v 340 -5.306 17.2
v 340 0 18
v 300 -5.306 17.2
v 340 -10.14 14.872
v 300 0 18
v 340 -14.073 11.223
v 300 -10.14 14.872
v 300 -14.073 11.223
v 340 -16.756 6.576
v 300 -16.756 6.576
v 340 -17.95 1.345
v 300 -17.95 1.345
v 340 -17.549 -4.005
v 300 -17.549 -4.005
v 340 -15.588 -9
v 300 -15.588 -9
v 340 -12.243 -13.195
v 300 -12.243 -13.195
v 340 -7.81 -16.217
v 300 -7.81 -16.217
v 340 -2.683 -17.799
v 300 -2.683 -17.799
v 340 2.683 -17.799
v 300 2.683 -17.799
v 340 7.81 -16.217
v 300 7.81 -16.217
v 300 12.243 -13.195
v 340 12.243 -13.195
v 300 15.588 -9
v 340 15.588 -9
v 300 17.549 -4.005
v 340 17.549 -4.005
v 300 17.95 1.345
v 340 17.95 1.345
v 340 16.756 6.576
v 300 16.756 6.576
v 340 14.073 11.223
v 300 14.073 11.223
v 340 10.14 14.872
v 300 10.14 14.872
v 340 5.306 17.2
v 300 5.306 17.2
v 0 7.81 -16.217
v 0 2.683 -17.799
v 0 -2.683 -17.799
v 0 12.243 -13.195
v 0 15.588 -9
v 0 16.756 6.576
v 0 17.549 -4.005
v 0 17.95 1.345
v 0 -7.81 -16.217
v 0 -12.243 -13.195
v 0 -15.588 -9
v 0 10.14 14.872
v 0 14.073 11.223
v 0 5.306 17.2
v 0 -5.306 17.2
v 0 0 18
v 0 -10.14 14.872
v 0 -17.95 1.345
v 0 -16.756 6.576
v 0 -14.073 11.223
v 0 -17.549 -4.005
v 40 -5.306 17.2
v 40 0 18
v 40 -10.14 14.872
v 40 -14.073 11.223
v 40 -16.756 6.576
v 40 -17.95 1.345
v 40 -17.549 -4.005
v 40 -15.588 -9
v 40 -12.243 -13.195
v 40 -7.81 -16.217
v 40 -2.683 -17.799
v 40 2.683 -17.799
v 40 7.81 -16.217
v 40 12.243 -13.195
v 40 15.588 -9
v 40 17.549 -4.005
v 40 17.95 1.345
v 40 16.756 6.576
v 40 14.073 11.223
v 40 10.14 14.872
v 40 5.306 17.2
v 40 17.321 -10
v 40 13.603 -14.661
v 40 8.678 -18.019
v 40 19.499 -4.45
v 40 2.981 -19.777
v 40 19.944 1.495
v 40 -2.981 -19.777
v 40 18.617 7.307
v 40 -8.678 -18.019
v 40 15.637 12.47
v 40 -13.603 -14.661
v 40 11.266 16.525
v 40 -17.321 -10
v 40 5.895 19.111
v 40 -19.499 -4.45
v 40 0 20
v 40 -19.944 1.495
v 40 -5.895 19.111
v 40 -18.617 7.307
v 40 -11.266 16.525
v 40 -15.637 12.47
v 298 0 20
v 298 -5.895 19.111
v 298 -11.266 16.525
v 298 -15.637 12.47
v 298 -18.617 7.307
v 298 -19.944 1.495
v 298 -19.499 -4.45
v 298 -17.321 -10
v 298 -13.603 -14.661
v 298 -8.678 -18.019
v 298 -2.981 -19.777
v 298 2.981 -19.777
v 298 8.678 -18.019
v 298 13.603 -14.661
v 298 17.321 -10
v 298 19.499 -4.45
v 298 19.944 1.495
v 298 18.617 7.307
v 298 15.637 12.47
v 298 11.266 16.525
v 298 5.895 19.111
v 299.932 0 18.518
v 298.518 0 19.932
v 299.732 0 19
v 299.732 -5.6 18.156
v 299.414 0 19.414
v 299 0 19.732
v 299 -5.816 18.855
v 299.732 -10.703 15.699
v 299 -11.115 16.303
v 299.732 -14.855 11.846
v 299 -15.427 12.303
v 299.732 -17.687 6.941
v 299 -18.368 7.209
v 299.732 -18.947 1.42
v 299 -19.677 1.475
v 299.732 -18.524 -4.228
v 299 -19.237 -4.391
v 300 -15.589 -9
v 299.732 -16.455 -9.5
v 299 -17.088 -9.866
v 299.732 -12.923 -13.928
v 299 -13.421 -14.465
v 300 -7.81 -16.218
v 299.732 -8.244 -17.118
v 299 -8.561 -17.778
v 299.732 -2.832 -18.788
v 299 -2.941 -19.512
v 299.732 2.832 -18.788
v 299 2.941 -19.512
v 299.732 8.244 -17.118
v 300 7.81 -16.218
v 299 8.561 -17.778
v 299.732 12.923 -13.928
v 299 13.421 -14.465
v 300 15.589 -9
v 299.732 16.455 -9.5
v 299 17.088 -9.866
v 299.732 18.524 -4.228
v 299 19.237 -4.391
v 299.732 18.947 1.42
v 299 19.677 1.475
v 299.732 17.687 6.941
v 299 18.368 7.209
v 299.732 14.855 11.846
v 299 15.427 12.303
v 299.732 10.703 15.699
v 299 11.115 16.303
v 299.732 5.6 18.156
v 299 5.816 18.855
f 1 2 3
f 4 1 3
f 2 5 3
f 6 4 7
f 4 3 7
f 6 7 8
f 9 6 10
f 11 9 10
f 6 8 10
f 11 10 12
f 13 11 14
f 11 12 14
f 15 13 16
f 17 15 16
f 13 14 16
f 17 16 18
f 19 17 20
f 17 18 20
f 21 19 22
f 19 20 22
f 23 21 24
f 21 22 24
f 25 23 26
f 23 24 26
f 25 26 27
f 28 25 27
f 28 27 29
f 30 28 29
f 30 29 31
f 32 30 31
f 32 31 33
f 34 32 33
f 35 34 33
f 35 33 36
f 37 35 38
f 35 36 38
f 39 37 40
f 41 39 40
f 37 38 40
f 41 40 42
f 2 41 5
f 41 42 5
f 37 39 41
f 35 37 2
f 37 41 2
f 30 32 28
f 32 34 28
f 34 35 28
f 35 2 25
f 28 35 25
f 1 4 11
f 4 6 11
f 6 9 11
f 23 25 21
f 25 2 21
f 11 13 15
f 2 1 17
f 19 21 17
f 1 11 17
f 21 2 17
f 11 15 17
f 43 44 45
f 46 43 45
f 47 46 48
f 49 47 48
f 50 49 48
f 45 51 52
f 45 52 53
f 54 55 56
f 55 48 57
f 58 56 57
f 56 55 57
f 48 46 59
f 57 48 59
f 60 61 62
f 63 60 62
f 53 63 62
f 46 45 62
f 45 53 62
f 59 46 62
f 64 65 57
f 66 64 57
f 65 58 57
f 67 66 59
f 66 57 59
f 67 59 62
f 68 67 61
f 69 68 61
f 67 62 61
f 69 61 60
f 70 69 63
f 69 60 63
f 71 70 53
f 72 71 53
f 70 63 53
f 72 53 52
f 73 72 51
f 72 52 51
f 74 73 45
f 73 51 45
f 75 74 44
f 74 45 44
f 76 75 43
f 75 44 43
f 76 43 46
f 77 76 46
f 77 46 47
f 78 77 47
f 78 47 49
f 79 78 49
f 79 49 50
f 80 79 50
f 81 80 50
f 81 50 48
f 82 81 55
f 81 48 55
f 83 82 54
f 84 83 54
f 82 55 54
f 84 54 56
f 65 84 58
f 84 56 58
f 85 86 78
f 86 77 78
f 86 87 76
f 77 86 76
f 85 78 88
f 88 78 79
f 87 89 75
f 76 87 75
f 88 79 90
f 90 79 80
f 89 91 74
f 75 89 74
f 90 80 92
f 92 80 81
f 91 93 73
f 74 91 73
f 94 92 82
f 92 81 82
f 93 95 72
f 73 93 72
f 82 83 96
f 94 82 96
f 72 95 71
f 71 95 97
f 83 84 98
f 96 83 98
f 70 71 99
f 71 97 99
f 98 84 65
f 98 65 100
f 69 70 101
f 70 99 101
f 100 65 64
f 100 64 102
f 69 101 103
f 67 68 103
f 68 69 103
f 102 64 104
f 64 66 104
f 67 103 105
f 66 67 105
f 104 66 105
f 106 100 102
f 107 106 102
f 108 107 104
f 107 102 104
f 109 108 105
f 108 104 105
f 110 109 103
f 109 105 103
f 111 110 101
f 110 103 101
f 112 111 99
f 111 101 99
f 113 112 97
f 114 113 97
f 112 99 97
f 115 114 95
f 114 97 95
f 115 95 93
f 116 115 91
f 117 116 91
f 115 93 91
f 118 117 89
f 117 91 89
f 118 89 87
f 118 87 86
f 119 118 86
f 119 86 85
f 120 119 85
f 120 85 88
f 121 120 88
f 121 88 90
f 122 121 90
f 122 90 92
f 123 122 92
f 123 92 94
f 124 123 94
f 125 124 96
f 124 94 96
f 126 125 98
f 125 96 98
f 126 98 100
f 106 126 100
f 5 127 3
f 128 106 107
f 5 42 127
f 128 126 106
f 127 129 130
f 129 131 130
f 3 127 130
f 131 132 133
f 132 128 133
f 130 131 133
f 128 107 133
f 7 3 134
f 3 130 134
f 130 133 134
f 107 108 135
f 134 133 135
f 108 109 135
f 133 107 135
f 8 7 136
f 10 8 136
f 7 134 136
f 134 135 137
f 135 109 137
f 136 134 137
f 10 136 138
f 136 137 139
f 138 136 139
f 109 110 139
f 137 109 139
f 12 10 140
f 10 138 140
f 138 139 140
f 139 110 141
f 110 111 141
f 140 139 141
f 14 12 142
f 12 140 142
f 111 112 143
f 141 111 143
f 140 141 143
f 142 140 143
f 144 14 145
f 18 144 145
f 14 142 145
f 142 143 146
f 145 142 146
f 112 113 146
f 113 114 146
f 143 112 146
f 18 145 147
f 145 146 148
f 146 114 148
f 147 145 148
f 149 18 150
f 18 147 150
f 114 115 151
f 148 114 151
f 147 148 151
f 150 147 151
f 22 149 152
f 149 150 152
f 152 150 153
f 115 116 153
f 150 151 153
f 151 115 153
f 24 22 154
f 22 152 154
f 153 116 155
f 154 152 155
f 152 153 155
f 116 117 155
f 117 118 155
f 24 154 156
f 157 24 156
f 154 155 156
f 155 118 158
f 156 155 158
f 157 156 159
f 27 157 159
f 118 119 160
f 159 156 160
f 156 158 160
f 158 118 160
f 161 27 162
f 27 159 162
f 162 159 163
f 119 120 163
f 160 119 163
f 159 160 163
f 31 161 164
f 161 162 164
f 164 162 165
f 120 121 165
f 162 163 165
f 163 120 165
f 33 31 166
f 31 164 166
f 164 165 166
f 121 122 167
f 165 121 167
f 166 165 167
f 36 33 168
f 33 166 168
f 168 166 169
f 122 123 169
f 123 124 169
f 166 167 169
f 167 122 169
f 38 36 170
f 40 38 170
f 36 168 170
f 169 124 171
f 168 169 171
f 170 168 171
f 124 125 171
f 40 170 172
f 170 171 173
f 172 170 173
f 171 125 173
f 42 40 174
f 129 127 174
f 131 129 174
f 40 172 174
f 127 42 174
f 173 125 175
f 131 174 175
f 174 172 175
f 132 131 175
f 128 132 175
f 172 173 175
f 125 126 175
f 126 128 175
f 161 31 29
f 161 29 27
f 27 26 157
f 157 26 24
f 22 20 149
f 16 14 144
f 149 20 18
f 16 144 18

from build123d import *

# Parameters (mm, degrees)
FILLET_1_R = 2


with BuildPart() as part:
    # 草图8 → 旋转1 (revolve)
    with BuildSketch(Plane.XY, mode=Mode.PRIVATE) as revolve_1_sk:
        Polygon((0, 0), (340, 0), (340, 18), (300, 18), (300, 20), (40, 20), (40, 18), (0, 18), align=None)
    revolve(revolve_1_sk.sketch.rotate(Axis((0, 0, 0), (1, 0, 0)), 90), axis=Axis((0, 0, 0), (1, 0, 0)))

    # 圆角1
    fillet_1_edges = [part.edges().sort_by_distance(p)[0] for p in [
        (300, 0, -20),
    ]]
    fillet(fillet_1_edges, radius=FILLET_1_R - 0.0001)  # a hair under: the kernel refuses the full size


solid = part.part
